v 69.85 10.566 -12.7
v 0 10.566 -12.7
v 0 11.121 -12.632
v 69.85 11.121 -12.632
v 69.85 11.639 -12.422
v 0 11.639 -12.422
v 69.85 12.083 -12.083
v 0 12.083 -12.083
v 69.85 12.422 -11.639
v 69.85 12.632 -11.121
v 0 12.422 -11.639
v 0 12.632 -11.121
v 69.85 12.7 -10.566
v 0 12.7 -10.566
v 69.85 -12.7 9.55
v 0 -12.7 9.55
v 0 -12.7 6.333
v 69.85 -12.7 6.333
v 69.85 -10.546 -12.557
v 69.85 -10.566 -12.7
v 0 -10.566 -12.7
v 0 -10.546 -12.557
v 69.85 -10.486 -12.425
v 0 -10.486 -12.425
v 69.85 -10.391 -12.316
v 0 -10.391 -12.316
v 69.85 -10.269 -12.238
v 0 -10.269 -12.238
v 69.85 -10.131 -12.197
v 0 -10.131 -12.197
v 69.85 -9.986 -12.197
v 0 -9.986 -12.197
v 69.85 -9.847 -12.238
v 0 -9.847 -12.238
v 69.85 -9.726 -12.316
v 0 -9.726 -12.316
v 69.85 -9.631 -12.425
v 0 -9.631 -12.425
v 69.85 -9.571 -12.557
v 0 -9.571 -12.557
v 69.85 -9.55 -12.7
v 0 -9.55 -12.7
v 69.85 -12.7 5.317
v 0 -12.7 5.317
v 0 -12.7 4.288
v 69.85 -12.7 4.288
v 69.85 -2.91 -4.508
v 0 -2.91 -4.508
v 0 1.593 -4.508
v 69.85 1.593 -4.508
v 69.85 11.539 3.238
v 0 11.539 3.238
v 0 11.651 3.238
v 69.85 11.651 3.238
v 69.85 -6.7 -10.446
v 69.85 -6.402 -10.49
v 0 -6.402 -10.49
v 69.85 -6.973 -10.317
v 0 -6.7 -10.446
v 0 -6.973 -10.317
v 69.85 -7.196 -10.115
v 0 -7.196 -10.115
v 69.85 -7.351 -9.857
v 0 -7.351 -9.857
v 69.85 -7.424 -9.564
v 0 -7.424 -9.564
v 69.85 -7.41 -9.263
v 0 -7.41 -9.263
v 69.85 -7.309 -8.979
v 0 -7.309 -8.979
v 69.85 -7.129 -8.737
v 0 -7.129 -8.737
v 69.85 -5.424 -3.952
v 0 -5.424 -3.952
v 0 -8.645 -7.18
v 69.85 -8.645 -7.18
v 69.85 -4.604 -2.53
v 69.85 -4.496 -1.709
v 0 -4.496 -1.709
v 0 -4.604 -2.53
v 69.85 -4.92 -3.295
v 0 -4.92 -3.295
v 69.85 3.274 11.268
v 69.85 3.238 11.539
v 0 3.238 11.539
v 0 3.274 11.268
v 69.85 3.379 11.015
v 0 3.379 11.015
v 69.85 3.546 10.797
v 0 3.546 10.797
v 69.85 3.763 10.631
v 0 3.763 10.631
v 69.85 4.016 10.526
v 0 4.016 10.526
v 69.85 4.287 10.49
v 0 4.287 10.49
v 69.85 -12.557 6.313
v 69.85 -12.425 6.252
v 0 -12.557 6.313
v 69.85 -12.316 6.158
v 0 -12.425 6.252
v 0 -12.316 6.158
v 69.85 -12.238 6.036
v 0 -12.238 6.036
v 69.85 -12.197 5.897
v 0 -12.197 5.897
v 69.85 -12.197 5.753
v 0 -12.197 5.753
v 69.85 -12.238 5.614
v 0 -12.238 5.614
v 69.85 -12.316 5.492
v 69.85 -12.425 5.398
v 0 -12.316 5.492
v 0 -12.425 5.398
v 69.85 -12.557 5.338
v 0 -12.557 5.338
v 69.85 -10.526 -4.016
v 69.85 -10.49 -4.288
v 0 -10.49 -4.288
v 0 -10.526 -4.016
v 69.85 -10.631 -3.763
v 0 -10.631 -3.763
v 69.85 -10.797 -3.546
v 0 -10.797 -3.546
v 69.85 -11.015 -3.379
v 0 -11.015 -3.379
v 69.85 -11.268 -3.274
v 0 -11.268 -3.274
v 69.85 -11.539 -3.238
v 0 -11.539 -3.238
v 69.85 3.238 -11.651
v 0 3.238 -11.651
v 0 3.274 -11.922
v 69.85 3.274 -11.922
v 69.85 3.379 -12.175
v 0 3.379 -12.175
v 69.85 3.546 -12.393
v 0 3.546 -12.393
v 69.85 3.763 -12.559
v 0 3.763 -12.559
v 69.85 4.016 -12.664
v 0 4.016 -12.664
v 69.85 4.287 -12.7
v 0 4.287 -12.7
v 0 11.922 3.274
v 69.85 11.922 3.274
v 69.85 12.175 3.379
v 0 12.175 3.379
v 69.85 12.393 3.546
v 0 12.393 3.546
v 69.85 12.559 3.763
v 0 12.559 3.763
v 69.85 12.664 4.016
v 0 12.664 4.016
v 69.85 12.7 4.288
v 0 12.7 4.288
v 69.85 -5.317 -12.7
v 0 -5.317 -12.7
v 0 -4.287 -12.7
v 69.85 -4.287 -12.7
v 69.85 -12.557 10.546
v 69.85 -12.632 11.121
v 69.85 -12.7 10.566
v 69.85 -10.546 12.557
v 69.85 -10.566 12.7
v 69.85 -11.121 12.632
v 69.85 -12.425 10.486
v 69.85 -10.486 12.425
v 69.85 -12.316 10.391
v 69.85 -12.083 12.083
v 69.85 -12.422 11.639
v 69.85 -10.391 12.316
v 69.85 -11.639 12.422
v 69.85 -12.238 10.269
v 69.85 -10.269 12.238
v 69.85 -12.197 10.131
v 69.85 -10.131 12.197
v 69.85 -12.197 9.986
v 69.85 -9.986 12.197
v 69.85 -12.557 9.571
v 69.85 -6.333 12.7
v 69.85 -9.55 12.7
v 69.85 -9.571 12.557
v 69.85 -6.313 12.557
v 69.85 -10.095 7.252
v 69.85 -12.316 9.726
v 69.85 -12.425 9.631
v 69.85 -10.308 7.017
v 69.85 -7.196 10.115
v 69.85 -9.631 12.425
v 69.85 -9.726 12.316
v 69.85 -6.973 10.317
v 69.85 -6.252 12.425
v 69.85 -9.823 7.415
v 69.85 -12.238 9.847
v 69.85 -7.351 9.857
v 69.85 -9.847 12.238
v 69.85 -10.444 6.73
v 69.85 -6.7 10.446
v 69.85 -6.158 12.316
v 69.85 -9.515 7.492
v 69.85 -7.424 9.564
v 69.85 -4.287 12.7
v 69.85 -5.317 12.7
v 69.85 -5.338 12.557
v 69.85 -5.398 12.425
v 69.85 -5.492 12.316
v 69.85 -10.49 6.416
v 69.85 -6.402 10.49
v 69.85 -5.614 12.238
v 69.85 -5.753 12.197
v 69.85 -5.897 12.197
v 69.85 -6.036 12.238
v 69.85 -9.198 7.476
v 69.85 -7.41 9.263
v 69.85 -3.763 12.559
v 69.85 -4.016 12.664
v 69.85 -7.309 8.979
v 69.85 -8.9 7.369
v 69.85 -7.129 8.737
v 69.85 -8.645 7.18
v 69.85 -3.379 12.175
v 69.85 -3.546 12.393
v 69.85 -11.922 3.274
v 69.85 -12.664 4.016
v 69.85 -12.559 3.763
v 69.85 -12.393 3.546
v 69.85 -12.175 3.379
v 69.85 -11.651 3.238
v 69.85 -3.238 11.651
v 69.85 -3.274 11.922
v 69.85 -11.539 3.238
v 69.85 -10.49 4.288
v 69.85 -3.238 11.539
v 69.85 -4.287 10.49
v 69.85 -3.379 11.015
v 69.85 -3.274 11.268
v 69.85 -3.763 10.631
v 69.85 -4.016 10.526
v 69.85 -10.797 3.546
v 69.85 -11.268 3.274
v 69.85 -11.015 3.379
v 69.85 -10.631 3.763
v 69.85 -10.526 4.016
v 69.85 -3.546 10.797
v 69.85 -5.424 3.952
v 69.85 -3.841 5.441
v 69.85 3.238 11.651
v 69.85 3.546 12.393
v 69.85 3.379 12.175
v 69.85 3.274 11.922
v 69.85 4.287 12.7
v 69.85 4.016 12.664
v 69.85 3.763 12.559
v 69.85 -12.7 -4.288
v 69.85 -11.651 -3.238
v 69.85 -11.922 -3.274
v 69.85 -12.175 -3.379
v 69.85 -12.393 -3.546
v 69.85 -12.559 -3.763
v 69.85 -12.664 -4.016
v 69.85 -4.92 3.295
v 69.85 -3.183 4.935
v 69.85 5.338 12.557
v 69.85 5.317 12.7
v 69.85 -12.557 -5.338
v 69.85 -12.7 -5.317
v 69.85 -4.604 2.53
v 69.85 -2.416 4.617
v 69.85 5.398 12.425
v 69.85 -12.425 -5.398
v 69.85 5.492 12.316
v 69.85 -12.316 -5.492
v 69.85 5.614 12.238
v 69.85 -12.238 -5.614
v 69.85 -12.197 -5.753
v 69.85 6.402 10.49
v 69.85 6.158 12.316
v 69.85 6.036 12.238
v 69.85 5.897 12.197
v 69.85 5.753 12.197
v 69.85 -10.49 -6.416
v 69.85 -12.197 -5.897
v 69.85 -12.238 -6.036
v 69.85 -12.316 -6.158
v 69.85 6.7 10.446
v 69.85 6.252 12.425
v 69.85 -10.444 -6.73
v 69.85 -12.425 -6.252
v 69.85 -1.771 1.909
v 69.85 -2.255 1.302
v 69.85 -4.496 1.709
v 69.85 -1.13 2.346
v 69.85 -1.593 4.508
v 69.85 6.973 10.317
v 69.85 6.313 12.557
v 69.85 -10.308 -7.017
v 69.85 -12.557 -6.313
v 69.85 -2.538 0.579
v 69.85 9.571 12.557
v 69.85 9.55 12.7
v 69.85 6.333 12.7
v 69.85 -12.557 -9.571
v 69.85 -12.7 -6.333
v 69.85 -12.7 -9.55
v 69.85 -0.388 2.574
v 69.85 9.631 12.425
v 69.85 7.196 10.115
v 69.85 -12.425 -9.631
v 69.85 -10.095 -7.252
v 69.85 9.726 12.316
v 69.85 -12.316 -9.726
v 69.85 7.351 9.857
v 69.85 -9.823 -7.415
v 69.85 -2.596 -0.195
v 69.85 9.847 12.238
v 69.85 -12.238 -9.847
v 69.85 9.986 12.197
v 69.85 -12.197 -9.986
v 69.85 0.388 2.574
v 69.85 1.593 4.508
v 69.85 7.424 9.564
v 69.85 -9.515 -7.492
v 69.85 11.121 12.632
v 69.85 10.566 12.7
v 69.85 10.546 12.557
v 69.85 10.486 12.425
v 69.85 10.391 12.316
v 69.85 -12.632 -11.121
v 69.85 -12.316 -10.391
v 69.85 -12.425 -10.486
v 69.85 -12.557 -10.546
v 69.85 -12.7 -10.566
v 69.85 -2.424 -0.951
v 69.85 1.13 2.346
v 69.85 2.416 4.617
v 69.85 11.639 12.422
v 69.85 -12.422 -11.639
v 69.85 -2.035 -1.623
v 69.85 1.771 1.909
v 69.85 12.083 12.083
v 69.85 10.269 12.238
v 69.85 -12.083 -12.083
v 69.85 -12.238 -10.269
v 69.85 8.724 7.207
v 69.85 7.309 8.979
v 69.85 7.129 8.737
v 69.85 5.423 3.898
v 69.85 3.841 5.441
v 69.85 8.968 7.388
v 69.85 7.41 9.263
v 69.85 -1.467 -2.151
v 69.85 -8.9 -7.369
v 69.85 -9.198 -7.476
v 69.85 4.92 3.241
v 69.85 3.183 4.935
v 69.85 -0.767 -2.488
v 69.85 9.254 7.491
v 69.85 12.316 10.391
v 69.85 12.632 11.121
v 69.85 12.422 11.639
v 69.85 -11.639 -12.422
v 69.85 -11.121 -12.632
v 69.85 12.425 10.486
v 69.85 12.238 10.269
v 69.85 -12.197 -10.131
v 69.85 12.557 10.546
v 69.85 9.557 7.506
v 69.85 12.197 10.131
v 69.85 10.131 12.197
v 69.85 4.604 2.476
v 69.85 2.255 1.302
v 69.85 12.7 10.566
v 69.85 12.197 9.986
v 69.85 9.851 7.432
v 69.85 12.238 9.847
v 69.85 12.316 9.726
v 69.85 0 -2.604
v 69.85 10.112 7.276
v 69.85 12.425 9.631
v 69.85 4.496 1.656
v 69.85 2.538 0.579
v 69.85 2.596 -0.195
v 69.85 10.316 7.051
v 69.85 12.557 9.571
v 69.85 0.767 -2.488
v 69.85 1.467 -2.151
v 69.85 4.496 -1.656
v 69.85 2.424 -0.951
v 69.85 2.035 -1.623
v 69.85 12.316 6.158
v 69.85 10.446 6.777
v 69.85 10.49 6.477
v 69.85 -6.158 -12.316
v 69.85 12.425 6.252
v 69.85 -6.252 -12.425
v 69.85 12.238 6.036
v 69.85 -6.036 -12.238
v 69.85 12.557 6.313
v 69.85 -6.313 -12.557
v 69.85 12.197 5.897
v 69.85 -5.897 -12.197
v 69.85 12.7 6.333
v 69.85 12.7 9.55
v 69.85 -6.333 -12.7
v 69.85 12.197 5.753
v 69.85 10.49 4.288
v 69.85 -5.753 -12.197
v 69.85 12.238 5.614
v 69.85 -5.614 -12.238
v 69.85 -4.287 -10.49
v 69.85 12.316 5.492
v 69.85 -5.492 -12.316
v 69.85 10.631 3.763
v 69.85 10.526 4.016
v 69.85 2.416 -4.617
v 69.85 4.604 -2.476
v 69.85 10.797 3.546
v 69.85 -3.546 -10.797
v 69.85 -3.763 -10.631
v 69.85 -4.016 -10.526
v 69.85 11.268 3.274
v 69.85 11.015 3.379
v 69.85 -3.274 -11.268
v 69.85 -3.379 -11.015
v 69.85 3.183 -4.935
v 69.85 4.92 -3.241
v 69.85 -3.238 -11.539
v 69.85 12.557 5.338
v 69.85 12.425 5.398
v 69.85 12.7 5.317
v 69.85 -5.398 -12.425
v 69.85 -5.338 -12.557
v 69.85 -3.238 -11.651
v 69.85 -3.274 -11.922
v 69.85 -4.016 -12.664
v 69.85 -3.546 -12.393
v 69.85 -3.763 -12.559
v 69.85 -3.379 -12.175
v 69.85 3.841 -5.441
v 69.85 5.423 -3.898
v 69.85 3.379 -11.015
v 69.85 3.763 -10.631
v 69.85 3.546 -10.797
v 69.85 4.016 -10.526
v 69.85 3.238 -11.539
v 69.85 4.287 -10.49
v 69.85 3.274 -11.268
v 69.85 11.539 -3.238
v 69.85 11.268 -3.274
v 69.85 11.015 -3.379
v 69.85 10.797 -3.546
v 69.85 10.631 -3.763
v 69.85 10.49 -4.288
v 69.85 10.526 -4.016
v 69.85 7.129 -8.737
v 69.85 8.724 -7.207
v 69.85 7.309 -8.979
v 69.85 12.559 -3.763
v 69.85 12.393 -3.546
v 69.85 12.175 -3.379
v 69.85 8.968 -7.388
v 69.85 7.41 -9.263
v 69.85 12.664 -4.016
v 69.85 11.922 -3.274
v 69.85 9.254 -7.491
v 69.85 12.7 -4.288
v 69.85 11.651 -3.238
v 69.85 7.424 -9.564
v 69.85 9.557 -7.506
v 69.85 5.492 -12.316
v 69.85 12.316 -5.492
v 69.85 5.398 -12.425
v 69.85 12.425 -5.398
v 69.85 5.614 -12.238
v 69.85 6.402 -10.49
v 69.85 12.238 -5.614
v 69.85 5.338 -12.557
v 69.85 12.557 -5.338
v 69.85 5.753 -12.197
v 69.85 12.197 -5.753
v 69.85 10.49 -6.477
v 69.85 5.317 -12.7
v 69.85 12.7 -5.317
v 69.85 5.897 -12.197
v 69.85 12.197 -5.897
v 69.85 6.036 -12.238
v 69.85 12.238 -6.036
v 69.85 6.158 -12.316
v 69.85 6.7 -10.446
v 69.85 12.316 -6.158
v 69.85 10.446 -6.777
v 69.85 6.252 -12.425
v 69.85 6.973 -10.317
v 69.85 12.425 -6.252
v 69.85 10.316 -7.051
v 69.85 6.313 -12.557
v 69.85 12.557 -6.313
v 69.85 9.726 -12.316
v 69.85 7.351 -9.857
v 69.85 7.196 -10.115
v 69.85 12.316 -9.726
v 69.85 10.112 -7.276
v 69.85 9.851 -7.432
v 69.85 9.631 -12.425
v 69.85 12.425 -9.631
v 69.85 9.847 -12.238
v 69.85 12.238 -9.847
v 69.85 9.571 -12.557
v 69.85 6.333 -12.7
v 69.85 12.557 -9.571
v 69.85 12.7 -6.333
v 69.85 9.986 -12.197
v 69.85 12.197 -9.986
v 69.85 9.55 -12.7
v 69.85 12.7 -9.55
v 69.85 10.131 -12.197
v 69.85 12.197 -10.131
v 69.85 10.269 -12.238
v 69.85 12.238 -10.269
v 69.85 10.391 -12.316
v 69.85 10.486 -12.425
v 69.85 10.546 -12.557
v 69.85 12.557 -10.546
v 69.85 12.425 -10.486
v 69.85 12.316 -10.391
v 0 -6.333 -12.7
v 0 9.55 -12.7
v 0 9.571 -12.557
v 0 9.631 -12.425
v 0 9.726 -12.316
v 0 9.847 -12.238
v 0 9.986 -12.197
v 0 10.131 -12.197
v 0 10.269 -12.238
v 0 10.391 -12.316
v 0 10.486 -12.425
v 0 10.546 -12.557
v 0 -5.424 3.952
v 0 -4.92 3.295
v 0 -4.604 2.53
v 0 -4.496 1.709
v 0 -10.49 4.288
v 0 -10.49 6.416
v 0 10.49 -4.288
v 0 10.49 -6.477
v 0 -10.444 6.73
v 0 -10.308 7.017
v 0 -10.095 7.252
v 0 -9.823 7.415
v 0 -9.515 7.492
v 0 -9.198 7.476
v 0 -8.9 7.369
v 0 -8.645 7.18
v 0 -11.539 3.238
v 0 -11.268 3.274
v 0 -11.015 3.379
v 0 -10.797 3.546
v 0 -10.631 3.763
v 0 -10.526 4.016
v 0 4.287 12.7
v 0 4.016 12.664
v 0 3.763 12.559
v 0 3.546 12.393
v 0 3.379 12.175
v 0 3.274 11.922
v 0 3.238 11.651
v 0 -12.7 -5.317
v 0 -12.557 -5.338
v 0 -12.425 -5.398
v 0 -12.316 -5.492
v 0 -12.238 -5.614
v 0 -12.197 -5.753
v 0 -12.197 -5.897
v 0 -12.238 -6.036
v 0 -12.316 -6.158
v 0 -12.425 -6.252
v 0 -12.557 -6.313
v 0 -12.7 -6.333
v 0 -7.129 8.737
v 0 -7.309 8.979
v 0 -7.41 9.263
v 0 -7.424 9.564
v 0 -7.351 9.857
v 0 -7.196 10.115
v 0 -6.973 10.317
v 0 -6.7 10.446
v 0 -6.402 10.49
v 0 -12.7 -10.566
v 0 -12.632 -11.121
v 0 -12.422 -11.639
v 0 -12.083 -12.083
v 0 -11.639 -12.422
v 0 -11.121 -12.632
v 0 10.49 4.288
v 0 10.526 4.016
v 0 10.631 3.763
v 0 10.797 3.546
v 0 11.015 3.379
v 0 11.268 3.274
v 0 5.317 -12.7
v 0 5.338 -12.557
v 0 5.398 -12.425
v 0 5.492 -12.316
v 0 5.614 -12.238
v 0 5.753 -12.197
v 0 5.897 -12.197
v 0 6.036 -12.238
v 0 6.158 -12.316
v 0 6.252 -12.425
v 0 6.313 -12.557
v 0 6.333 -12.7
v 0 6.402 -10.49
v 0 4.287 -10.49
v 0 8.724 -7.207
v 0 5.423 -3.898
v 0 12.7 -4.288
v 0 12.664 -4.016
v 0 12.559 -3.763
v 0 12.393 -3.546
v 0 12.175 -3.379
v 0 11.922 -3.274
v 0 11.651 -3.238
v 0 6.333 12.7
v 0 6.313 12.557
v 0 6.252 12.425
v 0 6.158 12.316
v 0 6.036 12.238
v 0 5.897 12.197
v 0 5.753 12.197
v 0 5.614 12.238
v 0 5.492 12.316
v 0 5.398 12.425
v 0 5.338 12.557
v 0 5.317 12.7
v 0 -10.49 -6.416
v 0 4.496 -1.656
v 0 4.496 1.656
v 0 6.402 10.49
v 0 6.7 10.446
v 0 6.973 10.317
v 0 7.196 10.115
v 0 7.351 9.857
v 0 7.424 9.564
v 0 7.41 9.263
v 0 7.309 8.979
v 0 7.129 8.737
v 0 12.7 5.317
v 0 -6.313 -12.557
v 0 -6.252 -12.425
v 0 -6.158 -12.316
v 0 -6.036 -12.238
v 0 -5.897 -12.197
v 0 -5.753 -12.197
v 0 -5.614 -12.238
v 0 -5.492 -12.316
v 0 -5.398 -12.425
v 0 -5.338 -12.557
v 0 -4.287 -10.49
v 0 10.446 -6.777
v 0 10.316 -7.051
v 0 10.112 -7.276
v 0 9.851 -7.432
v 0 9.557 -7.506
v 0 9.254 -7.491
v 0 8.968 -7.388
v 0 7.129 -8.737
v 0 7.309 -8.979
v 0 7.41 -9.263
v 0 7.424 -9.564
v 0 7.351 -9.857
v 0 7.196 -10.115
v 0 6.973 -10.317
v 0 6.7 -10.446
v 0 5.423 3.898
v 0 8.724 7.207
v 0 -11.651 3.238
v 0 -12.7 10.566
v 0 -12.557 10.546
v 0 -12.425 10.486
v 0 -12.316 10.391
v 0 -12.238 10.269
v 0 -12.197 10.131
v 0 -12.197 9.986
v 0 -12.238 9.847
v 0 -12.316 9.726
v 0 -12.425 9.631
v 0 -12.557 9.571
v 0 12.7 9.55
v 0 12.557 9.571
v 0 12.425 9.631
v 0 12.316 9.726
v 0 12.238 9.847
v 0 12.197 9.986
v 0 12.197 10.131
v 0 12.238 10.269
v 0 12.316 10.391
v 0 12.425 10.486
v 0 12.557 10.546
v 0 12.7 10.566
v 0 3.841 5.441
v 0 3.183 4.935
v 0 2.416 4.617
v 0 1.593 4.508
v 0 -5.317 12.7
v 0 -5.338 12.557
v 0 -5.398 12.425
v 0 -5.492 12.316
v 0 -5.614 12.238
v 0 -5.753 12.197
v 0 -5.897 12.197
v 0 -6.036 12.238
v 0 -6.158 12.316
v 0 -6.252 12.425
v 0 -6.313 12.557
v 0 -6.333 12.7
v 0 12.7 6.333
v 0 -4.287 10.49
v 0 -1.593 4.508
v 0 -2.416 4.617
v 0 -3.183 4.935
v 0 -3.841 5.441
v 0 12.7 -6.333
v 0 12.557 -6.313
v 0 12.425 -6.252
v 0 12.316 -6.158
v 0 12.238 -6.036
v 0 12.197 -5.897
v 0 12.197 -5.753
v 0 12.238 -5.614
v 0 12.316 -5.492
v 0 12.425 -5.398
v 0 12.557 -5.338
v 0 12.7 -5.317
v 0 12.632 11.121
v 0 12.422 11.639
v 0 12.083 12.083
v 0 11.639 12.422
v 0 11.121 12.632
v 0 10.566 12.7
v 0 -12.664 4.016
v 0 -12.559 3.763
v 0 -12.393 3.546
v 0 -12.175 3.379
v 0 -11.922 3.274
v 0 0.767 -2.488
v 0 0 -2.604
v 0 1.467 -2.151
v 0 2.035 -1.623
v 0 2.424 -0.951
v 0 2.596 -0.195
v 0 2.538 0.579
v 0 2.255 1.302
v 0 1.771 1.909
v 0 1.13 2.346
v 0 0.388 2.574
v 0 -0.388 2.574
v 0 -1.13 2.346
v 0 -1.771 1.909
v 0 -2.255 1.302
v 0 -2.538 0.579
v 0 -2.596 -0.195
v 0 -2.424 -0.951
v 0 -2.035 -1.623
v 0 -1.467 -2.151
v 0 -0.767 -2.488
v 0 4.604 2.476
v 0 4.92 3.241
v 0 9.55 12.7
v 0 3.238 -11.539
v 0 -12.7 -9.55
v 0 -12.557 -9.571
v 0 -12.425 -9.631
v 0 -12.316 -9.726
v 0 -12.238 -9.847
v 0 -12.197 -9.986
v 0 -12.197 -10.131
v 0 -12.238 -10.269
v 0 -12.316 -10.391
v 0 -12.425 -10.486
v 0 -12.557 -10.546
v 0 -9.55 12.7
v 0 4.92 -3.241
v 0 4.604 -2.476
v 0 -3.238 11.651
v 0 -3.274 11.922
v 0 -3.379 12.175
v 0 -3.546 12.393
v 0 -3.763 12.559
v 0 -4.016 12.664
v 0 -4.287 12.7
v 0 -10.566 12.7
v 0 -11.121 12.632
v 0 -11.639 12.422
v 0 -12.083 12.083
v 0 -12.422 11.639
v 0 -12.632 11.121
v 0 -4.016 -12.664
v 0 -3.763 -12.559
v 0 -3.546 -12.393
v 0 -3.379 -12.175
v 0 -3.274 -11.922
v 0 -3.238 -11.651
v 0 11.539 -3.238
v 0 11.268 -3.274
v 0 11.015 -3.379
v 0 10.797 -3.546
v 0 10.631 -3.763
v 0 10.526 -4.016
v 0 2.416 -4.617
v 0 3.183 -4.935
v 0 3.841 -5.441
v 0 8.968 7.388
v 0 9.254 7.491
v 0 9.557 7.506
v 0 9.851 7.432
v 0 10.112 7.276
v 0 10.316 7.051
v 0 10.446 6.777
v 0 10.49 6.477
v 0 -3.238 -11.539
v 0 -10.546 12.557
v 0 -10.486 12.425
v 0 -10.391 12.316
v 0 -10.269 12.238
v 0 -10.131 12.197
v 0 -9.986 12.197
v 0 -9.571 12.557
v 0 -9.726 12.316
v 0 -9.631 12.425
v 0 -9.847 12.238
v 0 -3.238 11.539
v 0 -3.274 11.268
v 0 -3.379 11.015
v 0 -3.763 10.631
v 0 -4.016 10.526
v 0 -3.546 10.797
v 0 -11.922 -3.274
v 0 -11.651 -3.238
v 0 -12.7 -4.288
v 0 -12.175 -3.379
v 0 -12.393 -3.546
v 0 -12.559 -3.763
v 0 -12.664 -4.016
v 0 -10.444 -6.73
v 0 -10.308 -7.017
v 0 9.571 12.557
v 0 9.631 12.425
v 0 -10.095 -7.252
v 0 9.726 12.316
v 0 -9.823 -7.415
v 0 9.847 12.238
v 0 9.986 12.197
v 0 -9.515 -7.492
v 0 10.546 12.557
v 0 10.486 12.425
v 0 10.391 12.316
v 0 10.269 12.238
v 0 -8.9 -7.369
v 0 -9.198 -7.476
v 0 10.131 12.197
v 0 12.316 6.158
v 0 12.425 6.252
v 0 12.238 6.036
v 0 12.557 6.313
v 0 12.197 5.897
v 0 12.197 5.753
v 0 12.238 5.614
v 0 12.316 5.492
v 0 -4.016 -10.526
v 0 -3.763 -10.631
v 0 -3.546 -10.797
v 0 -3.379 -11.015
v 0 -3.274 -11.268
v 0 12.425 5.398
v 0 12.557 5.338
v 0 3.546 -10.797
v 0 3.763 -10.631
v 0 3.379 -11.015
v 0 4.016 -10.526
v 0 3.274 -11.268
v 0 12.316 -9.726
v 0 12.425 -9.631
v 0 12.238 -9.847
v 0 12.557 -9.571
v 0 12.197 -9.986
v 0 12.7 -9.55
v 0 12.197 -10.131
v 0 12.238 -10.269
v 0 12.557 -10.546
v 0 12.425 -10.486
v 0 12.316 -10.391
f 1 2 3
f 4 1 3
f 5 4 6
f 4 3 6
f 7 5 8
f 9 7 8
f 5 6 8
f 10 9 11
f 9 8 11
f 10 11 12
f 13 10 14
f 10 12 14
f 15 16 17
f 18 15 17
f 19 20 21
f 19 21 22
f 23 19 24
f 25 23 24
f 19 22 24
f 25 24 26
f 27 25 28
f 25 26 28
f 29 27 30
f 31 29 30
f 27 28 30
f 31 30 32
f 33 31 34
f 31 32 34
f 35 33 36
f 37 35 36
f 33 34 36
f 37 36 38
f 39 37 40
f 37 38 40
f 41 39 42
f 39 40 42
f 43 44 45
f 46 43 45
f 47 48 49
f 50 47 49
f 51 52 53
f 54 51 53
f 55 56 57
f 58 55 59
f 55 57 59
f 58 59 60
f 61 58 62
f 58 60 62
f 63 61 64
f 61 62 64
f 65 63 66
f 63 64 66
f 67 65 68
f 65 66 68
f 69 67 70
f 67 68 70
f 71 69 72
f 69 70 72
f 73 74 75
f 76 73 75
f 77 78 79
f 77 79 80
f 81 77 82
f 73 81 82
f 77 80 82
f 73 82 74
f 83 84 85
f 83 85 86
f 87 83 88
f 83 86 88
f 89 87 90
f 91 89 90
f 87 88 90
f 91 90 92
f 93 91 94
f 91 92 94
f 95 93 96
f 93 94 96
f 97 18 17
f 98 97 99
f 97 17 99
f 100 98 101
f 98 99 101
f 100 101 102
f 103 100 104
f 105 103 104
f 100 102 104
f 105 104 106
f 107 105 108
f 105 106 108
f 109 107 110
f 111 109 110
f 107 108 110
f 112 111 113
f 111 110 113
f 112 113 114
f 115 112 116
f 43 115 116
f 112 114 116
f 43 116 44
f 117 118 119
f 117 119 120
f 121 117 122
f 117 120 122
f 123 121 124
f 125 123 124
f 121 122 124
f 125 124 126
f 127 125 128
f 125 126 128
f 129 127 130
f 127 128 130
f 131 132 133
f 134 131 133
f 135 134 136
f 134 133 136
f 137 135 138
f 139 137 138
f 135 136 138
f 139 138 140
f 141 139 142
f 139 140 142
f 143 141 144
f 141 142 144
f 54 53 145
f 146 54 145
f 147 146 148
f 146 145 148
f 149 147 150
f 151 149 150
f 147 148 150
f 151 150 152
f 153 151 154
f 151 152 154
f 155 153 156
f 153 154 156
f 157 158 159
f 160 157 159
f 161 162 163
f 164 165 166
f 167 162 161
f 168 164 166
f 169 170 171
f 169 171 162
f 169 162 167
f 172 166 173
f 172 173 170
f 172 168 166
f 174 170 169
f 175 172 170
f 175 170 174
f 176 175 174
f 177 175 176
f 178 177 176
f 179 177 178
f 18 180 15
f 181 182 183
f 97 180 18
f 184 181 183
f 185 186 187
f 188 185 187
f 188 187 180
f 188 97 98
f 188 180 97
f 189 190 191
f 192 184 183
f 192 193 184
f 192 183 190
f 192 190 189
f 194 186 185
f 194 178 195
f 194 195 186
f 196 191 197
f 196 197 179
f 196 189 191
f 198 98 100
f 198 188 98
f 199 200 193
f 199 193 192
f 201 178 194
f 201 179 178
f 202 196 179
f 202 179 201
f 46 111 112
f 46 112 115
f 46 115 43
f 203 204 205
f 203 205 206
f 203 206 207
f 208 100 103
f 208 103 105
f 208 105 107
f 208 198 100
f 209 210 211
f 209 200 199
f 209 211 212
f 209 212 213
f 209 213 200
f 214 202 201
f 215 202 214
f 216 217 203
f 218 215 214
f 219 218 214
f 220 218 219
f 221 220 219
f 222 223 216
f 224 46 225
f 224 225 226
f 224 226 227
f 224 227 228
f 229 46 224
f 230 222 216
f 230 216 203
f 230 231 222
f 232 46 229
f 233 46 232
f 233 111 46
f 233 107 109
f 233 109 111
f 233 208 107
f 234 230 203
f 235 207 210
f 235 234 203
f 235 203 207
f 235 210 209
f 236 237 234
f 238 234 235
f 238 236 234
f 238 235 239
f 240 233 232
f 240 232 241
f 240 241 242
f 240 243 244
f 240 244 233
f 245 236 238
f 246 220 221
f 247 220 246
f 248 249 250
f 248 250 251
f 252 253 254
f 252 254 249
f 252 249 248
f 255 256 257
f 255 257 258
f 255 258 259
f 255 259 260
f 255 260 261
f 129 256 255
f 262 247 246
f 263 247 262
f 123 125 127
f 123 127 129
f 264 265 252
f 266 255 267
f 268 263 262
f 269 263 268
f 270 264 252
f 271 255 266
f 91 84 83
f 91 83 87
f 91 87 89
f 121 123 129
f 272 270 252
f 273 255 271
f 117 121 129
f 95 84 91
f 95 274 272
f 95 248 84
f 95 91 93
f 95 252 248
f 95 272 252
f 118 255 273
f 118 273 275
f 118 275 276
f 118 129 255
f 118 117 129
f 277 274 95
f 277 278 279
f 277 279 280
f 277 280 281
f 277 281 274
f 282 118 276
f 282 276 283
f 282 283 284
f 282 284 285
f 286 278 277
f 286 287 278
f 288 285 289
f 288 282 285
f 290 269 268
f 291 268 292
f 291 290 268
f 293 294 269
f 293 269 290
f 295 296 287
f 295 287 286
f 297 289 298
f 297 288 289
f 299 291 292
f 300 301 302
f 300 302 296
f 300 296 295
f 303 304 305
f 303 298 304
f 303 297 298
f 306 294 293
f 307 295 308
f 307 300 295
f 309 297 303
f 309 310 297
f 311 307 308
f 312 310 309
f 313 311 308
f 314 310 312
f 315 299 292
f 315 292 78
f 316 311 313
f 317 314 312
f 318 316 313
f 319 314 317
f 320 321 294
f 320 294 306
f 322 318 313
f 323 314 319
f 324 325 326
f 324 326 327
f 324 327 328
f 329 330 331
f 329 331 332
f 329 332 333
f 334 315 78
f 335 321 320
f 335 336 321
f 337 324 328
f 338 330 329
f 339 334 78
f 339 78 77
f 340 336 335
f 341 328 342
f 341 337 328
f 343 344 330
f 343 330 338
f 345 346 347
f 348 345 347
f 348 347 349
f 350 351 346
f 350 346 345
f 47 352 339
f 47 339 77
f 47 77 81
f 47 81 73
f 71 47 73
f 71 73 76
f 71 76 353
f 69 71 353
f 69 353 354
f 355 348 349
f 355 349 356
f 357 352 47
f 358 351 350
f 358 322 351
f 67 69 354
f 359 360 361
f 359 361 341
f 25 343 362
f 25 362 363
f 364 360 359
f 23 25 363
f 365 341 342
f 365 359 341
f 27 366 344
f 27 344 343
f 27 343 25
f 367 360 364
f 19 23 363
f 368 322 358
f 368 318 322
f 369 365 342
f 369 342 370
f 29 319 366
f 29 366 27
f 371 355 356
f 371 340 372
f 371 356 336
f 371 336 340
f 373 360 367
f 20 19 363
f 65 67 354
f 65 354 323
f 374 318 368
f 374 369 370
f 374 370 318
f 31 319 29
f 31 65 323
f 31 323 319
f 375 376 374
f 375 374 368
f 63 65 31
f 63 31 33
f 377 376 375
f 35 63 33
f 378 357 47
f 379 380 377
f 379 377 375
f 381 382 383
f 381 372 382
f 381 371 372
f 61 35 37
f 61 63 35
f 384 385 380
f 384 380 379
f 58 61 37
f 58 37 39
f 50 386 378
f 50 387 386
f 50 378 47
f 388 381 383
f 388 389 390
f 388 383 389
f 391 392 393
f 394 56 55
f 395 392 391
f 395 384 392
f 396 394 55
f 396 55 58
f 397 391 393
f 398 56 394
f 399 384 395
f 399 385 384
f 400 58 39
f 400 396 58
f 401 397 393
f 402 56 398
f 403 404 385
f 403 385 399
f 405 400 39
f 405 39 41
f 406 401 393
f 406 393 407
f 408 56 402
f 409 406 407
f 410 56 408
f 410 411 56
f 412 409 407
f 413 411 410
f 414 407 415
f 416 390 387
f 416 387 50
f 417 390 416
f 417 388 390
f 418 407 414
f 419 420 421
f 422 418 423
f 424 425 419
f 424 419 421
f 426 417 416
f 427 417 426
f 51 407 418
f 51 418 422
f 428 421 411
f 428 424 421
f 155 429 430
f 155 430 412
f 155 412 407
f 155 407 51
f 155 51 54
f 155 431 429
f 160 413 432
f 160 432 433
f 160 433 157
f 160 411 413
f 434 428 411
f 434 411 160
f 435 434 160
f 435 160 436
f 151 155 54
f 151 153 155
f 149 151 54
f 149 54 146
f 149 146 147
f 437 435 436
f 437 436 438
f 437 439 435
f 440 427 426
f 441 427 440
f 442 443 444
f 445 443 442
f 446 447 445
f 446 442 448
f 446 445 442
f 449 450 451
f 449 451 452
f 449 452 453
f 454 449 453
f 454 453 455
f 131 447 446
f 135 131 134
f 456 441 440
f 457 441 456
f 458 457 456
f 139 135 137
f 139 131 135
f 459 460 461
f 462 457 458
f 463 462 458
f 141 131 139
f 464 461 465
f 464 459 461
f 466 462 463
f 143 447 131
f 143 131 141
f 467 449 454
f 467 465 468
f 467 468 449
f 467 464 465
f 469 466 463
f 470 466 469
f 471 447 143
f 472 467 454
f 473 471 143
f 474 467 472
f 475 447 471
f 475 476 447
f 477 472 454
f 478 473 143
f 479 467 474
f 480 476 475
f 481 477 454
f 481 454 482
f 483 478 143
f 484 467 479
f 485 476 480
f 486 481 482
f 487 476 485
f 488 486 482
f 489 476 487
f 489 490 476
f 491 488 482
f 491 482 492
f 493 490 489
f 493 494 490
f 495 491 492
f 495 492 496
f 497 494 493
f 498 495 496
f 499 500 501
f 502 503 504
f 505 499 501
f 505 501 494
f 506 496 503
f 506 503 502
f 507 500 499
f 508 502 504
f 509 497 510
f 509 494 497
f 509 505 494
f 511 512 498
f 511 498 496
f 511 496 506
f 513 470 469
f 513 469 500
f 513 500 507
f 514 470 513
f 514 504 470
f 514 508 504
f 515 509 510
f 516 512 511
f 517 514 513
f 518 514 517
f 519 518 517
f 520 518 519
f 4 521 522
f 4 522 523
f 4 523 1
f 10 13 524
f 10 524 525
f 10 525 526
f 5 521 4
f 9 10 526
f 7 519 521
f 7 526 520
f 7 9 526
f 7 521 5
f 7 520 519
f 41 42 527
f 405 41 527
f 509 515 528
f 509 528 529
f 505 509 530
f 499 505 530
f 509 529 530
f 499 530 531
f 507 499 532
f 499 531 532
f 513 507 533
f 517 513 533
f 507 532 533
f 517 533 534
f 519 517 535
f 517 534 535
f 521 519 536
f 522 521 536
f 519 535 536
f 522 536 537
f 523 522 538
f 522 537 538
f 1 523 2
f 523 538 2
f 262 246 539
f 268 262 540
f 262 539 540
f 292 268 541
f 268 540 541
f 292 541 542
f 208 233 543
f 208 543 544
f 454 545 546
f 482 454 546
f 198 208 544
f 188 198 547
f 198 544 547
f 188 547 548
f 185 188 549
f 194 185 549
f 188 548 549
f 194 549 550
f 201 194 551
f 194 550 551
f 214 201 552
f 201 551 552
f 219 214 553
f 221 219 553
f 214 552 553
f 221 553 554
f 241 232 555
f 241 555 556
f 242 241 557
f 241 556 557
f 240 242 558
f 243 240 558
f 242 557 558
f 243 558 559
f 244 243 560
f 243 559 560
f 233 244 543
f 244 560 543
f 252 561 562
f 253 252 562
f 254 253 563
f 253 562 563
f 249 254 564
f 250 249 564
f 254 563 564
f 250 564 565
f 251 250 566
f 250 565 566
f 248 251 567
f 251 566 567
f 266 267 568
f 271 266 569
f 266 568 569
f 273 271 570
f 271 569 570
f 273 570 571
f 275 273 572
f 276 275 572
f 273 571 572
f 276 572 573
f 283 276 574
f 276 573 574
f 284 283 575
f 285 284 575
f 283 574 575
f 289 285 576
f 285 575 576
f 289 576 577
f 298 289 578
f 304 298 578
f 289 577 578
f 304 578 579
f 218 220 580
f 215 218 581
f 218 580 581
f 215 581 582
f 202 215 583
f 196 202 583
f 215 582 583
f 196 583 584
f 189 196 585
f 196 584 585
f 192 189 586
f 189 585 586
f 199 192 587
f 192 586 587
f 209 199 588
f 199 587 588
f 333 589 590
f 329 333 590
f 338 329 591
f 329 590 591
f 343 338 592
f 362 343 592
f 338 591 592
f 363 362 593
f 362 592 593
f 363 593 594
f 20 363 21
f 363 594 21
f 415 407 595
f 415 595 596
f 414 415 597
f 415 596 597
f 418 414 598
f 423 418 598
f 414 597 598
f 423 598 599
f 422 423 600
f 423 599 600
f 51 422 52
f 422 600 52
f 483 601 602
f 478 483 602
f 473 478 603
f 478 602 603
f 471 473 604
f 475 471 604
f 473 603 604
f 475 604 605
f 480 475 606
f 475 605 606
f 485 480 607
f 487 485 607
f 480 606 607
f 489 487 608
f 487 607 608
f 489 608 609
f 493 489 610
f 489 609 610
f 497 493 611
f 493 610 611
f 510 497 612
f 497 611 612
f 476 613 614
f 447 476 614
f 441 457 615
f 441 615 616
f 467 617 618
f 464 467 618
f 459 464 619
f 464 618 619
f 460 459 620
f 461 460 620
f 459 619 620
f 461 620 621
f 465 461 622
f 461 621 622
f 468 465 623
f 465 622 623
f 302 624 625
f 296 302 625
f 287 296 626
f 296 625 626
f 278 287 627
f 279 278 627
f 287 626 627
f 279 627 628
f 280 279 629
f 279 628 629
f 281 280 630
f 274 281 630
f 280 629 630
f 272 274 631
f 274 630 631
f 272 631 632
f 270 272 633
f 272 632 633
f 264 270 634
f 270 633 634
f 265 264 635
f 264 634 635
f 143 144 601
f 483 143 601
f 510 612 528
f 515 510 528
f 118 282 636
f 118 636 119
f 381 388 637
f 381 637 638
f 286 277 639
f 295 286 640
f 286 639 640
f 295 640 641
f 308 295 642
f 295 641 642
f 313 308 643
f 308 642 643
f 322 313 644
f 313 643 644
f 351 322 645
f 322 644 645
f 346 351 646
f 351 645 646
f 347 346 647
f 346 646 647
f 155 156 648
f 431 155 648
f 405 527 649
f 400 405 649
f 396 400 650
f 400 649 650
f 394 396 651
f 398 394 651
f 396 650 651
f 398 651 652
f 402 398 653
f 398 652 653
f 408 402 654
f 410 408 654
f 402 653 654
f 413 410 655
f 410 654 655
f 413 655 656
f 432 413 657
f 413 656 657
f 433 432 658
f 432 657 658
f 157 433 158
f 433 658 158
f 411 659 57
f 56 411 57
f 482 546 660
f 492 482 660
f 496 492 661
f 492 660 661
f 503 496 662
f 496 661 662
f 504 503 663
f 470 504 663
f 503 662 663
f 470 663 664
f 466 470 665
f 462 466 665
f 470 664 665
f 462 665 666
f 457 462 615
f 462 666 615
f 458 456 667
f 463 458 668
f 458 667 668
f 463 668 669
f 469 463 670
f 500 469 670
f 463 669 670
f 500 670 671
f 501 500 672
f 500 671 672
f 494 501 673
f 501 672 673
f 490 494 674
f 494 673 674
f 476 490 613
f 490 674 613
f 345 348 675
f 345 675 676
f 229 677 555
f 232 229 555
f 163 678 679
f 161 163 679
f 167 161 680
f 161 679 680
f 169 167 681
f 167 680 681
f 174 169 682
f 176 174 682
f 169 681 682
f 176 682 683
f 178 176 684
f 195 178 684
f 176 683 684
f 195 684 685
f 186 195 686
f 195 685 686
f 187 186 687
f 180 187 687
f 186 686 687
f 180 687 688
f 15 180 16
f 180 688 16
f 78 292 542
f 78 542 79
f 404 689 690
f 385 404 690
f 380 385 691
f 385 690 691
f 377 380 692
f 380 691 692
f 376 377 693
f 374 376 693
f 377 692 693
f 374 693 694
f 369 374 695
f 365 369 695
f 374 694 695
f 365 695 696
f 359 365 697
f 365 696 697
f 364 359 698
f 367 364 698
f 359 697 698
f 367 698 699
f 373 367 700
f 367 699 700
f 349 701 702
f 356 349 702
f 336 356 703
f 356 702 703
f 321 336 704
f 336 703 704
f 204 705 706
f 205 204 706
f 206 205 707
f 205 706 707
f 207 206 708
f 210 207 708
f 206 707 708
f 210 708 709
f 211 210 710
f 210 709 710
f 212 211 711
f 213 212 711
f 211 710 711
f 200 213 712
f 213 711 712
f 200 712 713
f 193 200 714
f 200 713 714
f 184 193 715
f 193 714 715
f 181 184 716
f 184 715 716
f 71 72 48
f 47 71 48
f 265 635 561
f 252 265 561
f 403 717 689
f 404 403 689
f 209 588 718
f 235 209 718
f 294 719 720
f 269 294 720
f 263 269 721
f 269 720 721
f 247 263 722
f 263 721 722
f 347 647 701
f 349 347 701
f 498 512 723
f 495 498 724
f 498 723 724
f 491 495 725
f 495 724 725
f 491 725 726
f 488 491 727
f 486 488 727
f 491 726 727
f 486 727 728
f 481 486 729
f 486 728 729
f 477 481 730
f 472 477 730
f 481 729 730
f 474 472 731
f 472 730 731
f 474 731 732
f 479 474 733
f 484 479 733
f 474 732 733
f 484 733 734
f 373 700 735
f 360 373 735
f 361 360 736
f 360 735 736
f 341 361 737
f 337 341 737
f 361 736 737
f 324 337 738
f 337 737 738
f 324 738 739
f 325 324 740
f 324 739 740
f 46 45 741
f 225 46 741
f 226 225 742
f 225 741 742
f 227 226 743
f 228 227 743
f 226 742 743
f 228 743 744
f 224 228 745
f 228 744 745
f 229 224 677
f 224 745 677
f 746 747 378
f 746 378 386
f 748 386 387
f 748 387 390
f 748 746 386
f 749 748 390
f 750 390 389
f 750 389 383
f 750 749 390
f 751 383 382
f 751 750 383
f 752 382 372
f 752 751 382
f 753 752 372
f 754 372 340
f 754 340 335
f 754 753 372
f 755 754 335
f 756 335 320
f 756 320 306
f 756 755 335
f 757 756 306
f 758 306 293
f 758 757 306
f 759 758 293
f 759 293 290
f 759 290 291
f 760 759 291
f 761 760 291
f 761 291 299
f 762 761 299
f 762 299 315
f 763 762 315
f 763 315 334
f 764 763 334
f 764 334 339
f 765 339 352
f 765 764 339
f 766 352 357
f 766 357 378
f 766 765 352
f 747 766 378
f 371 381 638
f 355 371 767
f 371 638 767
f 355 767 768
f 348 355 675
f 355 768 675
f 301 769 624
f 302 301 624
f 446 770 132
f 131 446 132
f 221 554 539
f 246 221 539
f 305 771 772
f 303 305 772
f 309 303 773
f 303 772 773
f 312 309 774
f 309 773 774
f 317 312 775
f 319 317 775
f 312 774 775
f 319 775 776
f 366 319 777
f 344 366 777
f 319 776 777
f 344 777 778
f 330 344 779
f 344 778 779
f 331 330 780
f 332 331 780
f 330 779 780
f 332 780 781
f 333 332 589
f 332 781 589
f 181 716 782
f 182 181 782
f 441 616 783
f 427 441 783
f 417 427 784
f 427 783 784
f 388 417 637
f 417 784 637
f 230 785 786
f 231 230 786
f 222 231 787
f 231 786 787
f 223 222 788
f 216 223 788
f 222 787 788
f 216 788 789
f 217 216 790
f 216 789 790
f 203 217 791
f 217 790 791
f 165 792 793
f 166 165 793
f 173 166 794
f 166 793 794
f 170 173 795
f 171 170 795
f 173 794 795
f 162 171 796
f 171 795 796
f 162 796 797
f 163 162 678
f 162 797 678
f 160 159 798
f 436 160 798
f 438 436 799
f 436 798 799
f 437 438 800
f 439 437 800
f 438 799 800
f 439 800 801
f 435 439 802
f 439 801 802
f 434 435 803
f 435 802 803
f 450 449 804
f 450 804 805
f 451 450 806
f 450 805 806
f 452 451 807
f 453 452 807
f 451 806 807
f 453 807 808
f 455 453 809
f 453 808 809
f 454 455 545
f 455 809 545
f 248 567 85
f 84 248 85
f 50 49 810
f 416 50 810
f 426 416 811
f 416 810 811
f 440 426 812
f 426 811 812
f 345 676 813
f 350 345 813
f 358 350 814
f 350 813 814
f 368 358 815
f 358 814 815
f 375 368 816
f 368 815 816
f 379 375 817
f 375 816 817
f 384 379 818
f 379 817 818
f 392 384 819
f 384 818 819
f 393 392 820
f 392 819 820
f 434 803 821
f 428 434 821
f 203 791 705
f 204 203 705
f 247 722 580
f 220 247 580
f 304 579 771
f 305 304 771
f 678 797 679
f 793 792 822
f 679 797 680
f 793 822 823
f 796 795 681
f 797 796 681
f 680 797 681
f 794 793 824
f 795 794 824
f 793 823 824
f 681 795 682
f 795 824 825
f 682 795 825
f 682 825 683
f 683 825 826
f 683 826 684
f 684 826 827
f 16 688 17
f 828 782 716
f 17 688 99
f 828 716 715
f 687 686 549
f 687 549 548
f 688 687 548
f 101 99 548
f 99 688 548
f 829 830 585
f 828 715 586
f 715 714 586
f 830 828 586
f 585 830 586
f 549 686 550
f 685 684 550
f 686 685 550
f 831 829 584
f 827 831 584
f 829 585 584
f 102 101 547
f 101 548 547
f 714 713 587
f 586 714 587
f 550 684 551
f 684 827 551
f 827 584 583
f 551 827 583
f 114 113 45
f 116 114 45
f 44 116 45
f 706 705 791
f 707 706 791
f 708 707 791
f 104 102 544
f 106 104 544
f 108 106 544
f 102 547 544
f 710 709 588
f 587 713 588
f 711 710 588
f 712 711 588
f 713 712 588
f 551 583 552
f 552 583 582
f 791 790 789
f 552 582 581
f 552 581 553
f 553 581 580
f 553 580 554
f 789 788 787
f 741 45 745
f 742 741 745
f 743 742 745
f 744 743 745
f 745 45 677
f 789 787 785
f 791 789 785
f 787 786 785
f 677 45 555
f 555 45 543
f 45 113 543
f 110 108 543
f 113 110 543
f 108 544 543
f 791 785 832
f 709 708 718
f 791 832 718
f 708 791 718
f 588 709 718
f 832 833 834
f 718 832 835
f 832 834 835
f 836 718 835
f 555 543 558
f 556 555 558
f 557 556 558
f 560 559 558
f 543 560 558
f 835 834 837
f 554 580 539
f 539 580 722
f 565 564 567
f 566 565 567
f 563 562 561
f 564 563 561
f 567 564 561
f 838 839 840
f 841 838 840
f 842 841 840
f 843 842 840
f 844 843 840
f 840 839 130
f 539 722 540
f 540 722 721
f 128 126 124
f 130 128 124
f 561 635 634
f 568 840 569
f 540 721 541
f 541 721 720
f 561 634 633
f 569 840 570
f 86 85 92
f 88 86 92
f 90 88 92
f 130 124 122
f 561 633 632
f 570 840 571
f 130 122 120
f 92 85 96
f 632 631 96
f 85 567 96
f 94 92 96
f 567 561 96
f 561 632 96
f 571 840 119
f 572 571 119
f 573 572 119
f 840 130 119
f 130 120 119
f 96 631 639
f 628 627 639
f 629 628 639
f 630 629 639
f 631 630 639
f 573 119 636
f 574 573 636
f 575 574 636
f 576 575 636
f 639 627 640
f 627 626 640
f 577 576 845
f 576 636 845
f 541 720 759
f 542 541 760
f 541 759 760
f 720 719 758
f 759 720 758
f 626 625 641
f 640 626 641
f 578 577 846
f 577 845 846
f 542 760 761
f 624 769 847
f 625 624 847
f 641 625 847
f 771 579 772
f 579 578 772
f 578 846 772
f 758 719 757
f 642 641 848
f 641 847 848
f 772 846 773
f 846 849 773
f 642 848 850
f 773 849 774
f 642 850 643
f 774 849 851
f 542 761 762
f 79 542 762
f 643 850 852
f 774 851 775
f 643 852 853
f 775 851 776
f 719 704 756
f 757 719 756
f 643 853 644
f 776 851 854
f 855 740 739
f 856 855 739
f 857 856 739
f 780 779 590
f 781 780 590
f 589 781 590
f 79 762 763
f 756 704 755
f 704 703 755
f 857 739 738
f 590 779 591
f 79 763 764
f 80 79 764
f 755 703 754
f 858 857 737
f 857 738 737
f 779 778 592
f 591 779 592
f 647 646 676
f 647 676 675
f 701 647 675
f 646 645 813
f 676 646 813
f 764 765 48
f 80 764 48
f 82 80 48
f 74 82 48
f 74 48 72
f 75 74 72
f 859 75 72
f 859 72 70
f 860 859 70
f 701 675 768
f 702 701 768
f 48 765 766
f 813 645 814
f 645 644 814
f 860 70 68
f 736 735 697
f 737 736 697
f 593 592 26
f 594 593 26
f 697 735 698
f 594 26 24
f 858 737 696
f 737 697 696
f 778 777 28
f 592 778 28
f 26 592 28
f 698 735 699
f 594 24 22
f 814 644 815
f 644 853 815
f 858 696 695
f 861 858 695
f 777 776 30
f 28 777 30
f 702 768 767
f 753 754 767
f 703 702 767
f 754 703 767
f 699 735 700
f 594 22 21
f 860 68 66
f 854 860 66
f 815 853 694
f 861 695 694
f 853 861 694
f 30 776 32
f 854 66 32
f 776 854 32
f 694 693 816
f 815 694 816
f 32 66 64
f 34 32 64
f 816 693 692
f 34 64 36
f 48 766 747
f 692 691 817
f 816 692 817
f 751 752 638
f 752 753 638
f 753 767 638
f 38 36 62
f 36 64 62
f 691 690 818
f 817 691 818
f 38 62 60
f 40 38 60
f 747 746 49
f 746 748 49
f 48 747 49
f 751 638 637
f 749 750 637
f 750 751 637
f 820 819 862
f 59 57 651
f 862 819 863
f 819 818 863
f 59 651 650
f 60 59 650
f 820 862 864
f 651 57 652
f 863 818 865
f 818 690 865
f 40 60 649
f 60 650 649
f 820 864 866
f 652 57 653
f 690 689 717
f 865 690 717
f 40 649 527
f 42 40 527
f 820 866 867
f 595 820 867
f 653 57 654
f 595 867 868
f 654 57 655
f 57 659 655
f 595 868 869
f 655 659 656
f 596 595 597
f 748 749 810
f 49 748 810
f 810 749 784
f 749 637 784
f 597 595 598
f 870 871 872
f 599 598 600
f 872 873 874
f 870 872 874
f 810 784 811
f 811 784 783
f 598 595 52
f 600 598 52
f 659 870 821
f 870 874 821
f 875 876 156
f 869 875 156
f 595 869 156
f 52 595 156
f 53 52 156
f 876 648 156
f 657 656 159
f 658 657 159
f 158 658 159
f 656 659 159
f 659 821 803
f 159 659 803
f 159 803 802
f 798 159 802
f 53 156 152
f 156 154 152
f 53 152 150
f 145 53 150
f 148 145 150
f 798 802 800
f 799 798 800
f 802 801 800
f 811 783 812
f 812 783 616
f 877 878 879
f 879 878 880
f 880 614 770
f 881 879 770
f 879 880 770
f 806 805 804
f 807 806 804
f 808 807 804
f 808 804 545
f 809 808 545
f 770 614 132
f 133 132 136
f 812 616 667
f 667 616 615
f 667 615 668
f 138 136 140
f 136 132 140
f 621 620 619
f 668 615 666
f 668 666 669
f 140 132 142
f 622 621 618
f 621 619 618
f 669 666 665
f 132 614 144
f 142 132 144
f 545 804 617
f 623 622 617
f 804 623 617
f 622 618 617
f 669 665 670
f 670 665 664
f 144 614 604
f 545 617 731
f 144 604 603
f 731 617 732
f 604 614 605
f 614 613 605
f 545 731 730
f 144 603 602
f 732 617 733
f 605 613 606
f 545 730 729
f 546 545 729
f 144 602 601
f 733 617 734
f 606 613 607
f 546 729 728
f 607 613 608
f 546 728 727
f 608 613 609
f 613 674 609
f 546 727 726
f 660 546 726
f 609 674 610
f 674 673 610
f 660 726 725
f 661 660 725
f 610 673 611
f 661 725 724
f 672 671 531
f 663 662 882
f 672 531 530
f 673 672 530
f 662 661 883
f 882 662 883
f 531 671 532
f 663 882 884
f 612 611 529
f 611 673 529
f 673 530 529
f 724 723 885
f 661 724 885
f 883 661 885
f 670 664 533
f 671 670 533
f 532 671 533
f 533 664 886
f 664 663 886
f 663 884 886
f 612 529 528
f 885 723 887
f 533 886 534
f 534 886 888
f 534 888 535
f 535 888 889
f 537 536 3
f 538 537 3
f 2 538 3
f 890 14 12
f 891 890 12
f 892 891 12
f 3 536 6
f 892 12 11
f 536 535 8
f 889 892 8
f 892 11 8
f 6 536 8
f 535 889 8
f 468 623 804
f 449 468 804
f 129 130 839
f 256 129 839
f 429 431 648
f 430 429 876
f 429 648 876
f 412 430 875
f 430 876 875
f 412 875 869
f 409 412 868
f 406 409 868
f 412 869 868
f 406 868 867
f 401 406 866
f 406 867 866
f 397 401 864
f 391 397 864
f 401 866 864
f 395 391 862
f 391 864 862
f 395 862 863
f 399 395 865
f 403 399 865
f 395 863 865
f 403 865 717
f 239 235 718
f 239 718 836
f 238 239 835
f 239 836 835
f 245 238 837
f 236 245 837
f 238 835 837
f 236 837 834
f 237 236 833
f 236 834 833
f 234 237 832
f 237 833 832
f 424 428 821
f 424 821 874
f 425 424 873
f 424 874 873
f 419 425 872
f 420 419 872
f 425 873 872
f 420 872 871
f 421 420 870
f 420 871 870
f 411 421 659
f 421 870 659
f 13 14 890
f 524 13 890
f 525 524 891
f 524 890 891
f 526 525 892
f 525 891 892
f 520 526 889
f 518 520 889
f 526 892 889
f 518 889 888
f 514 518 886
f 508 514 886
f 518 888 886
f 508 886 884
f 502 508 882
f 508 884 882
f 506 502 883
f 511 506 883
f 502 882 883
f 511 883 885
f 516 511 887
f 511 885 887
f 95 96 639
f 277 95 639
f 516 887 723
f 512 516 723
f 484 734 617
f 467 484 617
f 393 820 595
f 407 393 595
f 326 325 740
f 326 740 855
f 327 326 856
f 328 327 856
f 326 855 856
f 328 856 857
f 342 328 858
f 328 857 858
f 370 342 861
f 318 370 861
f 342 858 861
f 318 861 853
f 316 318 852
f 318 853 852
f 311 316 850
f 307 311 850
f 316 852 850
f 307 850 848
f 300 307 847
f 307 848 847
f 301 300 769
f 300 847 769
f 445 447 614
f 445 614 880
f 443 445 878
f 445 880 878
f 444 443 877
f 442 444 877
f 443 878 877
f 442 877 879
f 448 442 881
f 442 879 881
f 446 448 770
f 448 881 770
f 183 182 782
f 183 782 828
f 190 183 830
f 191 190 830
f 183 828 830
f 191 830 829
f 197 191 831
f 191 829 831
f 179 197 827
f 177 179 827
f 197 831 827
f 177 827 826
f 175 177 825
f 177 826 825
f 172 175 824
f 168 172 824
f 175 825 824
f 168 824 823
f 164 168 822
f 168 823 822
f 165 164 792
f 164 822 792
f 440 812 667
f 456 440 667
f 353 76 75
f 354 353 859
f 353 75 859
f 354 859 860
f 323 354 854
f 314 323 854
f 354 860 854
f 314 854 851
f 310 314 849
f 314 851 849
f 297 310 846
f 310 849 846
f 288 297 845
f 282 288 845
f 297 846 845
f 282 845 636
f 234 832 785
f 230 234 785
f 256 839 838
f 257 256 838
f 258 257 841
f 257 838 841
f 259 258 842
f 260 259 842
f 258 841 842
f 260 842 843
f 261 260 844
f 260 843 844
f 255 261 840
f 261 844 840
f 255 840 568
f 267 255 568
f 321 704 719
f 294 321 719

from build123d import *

# Parameters (mm, degrees)
SKETCH1_R           = 2.6035
BOSS_EXTRUDE1_DEPTH = 69.85


with BuildPart() as part:
    # Sketch1 → Boss-Extrude1 (new body)
    with BuildSketch(Plane(origin=(0, 0, 0), x_dir=(0, 0, -1), z_dir=(1, 0, 0))):
        with BuildLine():
            Line((6.333126718, -12.7), (9.550443118, -12.7))
            ThreePointArc((9.550443118, -12.7), (10.058366869, -12.192000006), (10.566443095, -12.699847501))
            ThreePointArc((10.566443095, -12.699847501), (12.082537762, -12.08250727), (12.699846982, -10.566399977))
            ThreePointArc((12.699846982, -10.566399977), (12.192000006, -10.058323491), (12.7, -9.5504))
            Line((12.7, -9.5504), (12.7, -6.3330836))
            ThreePointArc((12.7, -6.3330836), (12.192, -5.8250836), (12.7, -5.3170836))
            Line((12.7, -5.3170836), (12.7, -4.287469289))
            ThreePointArc((12.7, -4.287469289), (12.39275138, -3.545705502), (11.650987593, -3.238456882))
            Line((11.650987593, -3.238456882), (11.539212407, -3.238456882))
            ThreePointArc((11.539212407, -3.238456882), (10.79744862, -3.545705502), (10.4902, -4.287469289))
            Line((10.4902, -4.287469289), (10.4902, -6.402089023))
            ThreePointArc((10.4902, -6.402089023), (9.856505071, -7.351067942), (8.737131347, -7.129408934))
            Line((8.737131347, -7.129408934), (4.5085, -2.9104418))
            Line((4.5085, -2.9104418), (4.5085, 1.593185507))
            ThreePointArc((4.5085, 1.593185507), (4.750877967, 2.809883091), (5.441005833, 3.840816462))
            Line((5.441005833, 3.840816462), (8.737131347, 7.129408934))
            ThreePointArc((8.737131347, 7.129408934), (9.856505071, 7.351067942), (10.4902, 6.402089023))
            Line((10.4902, 6.402089023), (10.4902, 4.287469289))
            ThreePointArc((10.4902, 4.287469289), (10.79744862, 3.545705502), (11.539212407, 3.238456882))
            Line((11.539212407, 3.238456882), (11.650987593, 3.238456882))
            ThreePointArc((11.650987593, 3.238456882), (12.39275138, 3.545705502), (12.7, 4.287469289))
            Line((12.7, 4.287469289), (12.7, 5.3170836))
            ThreePointArc((12.7, 5.3170836), (12.192, 5.8250836), (12.7, 6.3330836))
            Line((12.7, 6.3330836), (12.7, 9.5504))
            ThreePointArc((12.7, 9.5504), (12.192000006, 10.058323491), (12.699846982, 10.566399977))
            ThreePointArc((12.699846982, 10.566399977), (12.082537762, 12.08250727), (10.566443095, 12.699847501))
            ThreePointArc((10.566443095, 12.699847501), (10.058366869, 12.192000006), (9.550443118, 12.7))
            Line((9.550443118, 12.7), (6.333126718, 12.7))
            ThreePointArc((6.333126718, 12.7), (5.825126718, 12.192), (5.317126718, 12.7))
            Line((5.317126718, 12.7), (4.287512407, 12.7))
            ThreePointArc((4.287512407, 12.7), (3.54574862, 12.39275138), (3.2385, 11.650987593))
            Line((3.2385, 11.650987593), (3.2385, 11.539212407))
            ThreePointArc((3.2385, 11.539212407), (3.54574862, 10.79744862), (4.287512407, 10.4902))
            Line((4.287512407, 10.4902), (6.476788598, 10.4902))
            ThreePointArc((6.476788598, 10.4902), (7.432222385, 9.85140422), (7.207036008, 8.724370562))
            Line((7.207036008, 8.724370562), (3.898272566, 5.423169045))
            ThreePointArc((3.898272566, 5.423169045), (2.869120213, 4.736787962), (1.655778399, 4.4958))
            Line((1.655778399, 4.4958), (-1.655778399, 4.4958))
            ThreePointArc((-1.655778399, 4.4958), (-2.869120213, 4.736787962), (-3.898272566, 5.423169045))
            Line((-3.898272566, 5.423169045), (-7.207036008, 8.724370562))
            ThreePointArc((-7.207036008, 8.724370562), (-7.432222385, 9.85140422), (-6.476788598, 10.4902))
            Line((-6.476788598, 10.4902), (-4.287512407, 10.4902))
            ThreePointArc((-4.287512407, 10.4902), (-3.54574862, 10.79744862), (-3.2385, 11.539212407))
            Line((-3.2385, 11.539212407), (-3.2385, 11.650987593))
            ThreePointArc((-3.2385, 11.650987593), (-3.54574862, 12.39275138), (-4.287512407, 12.7))
            Line((-4.287512407, 12.7), (-5.317126718, 12.7))
            ThreePointArc((-5.317126718, 12.7), (-5.825126718, 12.192), (-6.333126718, 12.7))
            Line((-6.333126718, 12.7), (-9.550443118, 12.7))
            ThreePointArc((-9.550443118, 12.7), (-10.058366869, 12.192000006), (-10.566443095, 12.699847501))
            ThreePointArc((-10.566443095, 12.699847501), (-12.082537762, 12.08250727), (-12.699846982, 10.566399977))
            ThreePointArc((-12.699846982, 10.566399977), (-12.192000006, 10.058323491), (-12.7, 9.5504))
            Line((-12.7, 9.5504), (-12.7, 6.3330836))
            ThreePointArc((-12.7, 6.3330836), (-12.192, 5.8250836), (-12.7, 5.3170836))
            Line((-12.7, 5.3170836), (-12.7, 4.287469289))
            ThreePointArc((-12.7, 4.287469289), (-12.39275138, 3.545705502), (-11.650987593, 3.238456882))
            Line((-11.650987593, 3.238456882), (-11.539212407, 3.238456882))
            ThreePointArc((-11.539212407, 3.238456882), (-10.79744862, 3.545705502), (-10.4902, 4.287469289))
            Line((-10.4902, 4.287469289), (-10.4902, 6.402089023))
            ThreePointArc((-10.4902, 6.402089023), (-9.856505071, 7.351067942), (-8.737131347, 7.129408934))
            Line((-8.737131347, 7.129408934), (-5.441005833, 3.840816462))
            ThreePointArc((-5.441005833, 3.840816462), (-4.750877967, 2.809883091), (-4.5085, 1.593185507))
            Line((-4.5085, 1.593185507), (-4.5085, -1.593185507))
            ThreePointArc((-4.5085, -1.593185507), (-4.750877967, -2.809883091), (-5.441005833, -3.840816462))
            Line((-5.441005833, -3.840816462), (-8.737131347, -7.129408934))
            ThreePointArc((-8.737131347, -7.129408934), (-9.856505071, -7.351067942), (-10.4902, -6.402089023))
            Line((-10.4902, -6.402089023), (-10.4902, -4.287469289))
            ThreePointArc((-10.4902, -4.287469289), (-10.79744862, -3.545705502), (-11.539212407, -3.238456882))
            Line((-11.539212407, -3.238456882), (-11.650987593, -3.238456882))
            ThreePointArc((-11.650987593, -3.238456882), (-12.39275138, -3.545705502), (-12.7, -4.287469289))
            Line((-12.7, -4.287469289), (-12.7, -5.3170836))
            ThreePointArc((-12.7, -5.3170836), (-12.192, -5.8250836), (-12.7, -6.3330836))
            Line((-12.7, -6.3330836), (-12.7, -9.5504))
            ThreePointArc((-12.7, -9.5504), (-12.192000006, -10.058323491), (-12.699846982, -10.566399977))
            ThreePointArc((-12.699846982, -10.566399977), (-12.082537762, -12.08250727), (-10.566443095, -12.699847501))
            ThreePointArc((-10.566443095, -12.699847501), (-10.058366869, -12.192000006), (-9.550443118, -12.7))
            Line((-9.550443118, -12.7), (-6.333126718, -12.7))
            ThreePointArc((-6.333126718, -12.7), (-5.825126718, -12.192), (-5.317126718, -12.7))
            Line((-5.317126718, -12.7), (-4.287512407, -12.7))
            ThreePointArc((-4.287512407, -12.7), (-3.54574862, -12.39275138), (-3.2385, -11.650987593))
            Line((-3.2385, -11.650987593), (-3.2385, -11.539212407))
            ThreePointArc((-3.2385, -11.539212407), (-3.54574862, -10.79744862), (-4.287512407, -10.4902))
            Line((-4.287512407, -10.4902), (-6.416408329, -10.4902))
            ThreePointArc((-6.416408329, -10.4902), (-7.41473083, -9.822813117), (-7.179650497, -8.645192506))
            Line((-7.179650497, -8.645192506), (-3.952270251, -5.423690499))
            ThreePointArc((-3.952270251, -5.423690499), (-2.922936451, -4.736929036), (-1.709253557, -4.4958))
            Line((-1.709253557, -4.4958), (1.709253557, -4.4958))
            ThreePointArc((1.709253557, -4.4958), (2.922936451, -4.736929036), (3.952270251, -5.423690499))
            Line((3.952270251, -5.423690499), (7.179650497, -8.645192506))
            ThreePointArc((7.179650497, -8.645192506), (7.41473083, -9.822813117), (6.416408329, -10.4902))
            Line((6.416408329, -10.4902), (4.287512407, -10.4902))
            ThreePointArc((4.287512407, -10.4902), (3.54574862, -10.79744862), (3.2385, -11.539212407))
            Line((3.2385, -11.539212407), (3.2385, -11.650987593))
            ThreePointArc((3.2385, -11.650987593), (3.54574862, -12.39275138), (4.287512407, -12.7))
            Line((4.287512407, -12.7), (5.317126718, -12.7))
            ThreePointArc((5.317126718, -12.7), (5.825126718, -12.192), (6.333126718, -12.7))
        make_face()
        Circle(SKETCH1_R, mode=Mode.SUBTRACT)
    extrude(amount=BOSS_EXTRUDE1_DEPTH)


solid = part.part
